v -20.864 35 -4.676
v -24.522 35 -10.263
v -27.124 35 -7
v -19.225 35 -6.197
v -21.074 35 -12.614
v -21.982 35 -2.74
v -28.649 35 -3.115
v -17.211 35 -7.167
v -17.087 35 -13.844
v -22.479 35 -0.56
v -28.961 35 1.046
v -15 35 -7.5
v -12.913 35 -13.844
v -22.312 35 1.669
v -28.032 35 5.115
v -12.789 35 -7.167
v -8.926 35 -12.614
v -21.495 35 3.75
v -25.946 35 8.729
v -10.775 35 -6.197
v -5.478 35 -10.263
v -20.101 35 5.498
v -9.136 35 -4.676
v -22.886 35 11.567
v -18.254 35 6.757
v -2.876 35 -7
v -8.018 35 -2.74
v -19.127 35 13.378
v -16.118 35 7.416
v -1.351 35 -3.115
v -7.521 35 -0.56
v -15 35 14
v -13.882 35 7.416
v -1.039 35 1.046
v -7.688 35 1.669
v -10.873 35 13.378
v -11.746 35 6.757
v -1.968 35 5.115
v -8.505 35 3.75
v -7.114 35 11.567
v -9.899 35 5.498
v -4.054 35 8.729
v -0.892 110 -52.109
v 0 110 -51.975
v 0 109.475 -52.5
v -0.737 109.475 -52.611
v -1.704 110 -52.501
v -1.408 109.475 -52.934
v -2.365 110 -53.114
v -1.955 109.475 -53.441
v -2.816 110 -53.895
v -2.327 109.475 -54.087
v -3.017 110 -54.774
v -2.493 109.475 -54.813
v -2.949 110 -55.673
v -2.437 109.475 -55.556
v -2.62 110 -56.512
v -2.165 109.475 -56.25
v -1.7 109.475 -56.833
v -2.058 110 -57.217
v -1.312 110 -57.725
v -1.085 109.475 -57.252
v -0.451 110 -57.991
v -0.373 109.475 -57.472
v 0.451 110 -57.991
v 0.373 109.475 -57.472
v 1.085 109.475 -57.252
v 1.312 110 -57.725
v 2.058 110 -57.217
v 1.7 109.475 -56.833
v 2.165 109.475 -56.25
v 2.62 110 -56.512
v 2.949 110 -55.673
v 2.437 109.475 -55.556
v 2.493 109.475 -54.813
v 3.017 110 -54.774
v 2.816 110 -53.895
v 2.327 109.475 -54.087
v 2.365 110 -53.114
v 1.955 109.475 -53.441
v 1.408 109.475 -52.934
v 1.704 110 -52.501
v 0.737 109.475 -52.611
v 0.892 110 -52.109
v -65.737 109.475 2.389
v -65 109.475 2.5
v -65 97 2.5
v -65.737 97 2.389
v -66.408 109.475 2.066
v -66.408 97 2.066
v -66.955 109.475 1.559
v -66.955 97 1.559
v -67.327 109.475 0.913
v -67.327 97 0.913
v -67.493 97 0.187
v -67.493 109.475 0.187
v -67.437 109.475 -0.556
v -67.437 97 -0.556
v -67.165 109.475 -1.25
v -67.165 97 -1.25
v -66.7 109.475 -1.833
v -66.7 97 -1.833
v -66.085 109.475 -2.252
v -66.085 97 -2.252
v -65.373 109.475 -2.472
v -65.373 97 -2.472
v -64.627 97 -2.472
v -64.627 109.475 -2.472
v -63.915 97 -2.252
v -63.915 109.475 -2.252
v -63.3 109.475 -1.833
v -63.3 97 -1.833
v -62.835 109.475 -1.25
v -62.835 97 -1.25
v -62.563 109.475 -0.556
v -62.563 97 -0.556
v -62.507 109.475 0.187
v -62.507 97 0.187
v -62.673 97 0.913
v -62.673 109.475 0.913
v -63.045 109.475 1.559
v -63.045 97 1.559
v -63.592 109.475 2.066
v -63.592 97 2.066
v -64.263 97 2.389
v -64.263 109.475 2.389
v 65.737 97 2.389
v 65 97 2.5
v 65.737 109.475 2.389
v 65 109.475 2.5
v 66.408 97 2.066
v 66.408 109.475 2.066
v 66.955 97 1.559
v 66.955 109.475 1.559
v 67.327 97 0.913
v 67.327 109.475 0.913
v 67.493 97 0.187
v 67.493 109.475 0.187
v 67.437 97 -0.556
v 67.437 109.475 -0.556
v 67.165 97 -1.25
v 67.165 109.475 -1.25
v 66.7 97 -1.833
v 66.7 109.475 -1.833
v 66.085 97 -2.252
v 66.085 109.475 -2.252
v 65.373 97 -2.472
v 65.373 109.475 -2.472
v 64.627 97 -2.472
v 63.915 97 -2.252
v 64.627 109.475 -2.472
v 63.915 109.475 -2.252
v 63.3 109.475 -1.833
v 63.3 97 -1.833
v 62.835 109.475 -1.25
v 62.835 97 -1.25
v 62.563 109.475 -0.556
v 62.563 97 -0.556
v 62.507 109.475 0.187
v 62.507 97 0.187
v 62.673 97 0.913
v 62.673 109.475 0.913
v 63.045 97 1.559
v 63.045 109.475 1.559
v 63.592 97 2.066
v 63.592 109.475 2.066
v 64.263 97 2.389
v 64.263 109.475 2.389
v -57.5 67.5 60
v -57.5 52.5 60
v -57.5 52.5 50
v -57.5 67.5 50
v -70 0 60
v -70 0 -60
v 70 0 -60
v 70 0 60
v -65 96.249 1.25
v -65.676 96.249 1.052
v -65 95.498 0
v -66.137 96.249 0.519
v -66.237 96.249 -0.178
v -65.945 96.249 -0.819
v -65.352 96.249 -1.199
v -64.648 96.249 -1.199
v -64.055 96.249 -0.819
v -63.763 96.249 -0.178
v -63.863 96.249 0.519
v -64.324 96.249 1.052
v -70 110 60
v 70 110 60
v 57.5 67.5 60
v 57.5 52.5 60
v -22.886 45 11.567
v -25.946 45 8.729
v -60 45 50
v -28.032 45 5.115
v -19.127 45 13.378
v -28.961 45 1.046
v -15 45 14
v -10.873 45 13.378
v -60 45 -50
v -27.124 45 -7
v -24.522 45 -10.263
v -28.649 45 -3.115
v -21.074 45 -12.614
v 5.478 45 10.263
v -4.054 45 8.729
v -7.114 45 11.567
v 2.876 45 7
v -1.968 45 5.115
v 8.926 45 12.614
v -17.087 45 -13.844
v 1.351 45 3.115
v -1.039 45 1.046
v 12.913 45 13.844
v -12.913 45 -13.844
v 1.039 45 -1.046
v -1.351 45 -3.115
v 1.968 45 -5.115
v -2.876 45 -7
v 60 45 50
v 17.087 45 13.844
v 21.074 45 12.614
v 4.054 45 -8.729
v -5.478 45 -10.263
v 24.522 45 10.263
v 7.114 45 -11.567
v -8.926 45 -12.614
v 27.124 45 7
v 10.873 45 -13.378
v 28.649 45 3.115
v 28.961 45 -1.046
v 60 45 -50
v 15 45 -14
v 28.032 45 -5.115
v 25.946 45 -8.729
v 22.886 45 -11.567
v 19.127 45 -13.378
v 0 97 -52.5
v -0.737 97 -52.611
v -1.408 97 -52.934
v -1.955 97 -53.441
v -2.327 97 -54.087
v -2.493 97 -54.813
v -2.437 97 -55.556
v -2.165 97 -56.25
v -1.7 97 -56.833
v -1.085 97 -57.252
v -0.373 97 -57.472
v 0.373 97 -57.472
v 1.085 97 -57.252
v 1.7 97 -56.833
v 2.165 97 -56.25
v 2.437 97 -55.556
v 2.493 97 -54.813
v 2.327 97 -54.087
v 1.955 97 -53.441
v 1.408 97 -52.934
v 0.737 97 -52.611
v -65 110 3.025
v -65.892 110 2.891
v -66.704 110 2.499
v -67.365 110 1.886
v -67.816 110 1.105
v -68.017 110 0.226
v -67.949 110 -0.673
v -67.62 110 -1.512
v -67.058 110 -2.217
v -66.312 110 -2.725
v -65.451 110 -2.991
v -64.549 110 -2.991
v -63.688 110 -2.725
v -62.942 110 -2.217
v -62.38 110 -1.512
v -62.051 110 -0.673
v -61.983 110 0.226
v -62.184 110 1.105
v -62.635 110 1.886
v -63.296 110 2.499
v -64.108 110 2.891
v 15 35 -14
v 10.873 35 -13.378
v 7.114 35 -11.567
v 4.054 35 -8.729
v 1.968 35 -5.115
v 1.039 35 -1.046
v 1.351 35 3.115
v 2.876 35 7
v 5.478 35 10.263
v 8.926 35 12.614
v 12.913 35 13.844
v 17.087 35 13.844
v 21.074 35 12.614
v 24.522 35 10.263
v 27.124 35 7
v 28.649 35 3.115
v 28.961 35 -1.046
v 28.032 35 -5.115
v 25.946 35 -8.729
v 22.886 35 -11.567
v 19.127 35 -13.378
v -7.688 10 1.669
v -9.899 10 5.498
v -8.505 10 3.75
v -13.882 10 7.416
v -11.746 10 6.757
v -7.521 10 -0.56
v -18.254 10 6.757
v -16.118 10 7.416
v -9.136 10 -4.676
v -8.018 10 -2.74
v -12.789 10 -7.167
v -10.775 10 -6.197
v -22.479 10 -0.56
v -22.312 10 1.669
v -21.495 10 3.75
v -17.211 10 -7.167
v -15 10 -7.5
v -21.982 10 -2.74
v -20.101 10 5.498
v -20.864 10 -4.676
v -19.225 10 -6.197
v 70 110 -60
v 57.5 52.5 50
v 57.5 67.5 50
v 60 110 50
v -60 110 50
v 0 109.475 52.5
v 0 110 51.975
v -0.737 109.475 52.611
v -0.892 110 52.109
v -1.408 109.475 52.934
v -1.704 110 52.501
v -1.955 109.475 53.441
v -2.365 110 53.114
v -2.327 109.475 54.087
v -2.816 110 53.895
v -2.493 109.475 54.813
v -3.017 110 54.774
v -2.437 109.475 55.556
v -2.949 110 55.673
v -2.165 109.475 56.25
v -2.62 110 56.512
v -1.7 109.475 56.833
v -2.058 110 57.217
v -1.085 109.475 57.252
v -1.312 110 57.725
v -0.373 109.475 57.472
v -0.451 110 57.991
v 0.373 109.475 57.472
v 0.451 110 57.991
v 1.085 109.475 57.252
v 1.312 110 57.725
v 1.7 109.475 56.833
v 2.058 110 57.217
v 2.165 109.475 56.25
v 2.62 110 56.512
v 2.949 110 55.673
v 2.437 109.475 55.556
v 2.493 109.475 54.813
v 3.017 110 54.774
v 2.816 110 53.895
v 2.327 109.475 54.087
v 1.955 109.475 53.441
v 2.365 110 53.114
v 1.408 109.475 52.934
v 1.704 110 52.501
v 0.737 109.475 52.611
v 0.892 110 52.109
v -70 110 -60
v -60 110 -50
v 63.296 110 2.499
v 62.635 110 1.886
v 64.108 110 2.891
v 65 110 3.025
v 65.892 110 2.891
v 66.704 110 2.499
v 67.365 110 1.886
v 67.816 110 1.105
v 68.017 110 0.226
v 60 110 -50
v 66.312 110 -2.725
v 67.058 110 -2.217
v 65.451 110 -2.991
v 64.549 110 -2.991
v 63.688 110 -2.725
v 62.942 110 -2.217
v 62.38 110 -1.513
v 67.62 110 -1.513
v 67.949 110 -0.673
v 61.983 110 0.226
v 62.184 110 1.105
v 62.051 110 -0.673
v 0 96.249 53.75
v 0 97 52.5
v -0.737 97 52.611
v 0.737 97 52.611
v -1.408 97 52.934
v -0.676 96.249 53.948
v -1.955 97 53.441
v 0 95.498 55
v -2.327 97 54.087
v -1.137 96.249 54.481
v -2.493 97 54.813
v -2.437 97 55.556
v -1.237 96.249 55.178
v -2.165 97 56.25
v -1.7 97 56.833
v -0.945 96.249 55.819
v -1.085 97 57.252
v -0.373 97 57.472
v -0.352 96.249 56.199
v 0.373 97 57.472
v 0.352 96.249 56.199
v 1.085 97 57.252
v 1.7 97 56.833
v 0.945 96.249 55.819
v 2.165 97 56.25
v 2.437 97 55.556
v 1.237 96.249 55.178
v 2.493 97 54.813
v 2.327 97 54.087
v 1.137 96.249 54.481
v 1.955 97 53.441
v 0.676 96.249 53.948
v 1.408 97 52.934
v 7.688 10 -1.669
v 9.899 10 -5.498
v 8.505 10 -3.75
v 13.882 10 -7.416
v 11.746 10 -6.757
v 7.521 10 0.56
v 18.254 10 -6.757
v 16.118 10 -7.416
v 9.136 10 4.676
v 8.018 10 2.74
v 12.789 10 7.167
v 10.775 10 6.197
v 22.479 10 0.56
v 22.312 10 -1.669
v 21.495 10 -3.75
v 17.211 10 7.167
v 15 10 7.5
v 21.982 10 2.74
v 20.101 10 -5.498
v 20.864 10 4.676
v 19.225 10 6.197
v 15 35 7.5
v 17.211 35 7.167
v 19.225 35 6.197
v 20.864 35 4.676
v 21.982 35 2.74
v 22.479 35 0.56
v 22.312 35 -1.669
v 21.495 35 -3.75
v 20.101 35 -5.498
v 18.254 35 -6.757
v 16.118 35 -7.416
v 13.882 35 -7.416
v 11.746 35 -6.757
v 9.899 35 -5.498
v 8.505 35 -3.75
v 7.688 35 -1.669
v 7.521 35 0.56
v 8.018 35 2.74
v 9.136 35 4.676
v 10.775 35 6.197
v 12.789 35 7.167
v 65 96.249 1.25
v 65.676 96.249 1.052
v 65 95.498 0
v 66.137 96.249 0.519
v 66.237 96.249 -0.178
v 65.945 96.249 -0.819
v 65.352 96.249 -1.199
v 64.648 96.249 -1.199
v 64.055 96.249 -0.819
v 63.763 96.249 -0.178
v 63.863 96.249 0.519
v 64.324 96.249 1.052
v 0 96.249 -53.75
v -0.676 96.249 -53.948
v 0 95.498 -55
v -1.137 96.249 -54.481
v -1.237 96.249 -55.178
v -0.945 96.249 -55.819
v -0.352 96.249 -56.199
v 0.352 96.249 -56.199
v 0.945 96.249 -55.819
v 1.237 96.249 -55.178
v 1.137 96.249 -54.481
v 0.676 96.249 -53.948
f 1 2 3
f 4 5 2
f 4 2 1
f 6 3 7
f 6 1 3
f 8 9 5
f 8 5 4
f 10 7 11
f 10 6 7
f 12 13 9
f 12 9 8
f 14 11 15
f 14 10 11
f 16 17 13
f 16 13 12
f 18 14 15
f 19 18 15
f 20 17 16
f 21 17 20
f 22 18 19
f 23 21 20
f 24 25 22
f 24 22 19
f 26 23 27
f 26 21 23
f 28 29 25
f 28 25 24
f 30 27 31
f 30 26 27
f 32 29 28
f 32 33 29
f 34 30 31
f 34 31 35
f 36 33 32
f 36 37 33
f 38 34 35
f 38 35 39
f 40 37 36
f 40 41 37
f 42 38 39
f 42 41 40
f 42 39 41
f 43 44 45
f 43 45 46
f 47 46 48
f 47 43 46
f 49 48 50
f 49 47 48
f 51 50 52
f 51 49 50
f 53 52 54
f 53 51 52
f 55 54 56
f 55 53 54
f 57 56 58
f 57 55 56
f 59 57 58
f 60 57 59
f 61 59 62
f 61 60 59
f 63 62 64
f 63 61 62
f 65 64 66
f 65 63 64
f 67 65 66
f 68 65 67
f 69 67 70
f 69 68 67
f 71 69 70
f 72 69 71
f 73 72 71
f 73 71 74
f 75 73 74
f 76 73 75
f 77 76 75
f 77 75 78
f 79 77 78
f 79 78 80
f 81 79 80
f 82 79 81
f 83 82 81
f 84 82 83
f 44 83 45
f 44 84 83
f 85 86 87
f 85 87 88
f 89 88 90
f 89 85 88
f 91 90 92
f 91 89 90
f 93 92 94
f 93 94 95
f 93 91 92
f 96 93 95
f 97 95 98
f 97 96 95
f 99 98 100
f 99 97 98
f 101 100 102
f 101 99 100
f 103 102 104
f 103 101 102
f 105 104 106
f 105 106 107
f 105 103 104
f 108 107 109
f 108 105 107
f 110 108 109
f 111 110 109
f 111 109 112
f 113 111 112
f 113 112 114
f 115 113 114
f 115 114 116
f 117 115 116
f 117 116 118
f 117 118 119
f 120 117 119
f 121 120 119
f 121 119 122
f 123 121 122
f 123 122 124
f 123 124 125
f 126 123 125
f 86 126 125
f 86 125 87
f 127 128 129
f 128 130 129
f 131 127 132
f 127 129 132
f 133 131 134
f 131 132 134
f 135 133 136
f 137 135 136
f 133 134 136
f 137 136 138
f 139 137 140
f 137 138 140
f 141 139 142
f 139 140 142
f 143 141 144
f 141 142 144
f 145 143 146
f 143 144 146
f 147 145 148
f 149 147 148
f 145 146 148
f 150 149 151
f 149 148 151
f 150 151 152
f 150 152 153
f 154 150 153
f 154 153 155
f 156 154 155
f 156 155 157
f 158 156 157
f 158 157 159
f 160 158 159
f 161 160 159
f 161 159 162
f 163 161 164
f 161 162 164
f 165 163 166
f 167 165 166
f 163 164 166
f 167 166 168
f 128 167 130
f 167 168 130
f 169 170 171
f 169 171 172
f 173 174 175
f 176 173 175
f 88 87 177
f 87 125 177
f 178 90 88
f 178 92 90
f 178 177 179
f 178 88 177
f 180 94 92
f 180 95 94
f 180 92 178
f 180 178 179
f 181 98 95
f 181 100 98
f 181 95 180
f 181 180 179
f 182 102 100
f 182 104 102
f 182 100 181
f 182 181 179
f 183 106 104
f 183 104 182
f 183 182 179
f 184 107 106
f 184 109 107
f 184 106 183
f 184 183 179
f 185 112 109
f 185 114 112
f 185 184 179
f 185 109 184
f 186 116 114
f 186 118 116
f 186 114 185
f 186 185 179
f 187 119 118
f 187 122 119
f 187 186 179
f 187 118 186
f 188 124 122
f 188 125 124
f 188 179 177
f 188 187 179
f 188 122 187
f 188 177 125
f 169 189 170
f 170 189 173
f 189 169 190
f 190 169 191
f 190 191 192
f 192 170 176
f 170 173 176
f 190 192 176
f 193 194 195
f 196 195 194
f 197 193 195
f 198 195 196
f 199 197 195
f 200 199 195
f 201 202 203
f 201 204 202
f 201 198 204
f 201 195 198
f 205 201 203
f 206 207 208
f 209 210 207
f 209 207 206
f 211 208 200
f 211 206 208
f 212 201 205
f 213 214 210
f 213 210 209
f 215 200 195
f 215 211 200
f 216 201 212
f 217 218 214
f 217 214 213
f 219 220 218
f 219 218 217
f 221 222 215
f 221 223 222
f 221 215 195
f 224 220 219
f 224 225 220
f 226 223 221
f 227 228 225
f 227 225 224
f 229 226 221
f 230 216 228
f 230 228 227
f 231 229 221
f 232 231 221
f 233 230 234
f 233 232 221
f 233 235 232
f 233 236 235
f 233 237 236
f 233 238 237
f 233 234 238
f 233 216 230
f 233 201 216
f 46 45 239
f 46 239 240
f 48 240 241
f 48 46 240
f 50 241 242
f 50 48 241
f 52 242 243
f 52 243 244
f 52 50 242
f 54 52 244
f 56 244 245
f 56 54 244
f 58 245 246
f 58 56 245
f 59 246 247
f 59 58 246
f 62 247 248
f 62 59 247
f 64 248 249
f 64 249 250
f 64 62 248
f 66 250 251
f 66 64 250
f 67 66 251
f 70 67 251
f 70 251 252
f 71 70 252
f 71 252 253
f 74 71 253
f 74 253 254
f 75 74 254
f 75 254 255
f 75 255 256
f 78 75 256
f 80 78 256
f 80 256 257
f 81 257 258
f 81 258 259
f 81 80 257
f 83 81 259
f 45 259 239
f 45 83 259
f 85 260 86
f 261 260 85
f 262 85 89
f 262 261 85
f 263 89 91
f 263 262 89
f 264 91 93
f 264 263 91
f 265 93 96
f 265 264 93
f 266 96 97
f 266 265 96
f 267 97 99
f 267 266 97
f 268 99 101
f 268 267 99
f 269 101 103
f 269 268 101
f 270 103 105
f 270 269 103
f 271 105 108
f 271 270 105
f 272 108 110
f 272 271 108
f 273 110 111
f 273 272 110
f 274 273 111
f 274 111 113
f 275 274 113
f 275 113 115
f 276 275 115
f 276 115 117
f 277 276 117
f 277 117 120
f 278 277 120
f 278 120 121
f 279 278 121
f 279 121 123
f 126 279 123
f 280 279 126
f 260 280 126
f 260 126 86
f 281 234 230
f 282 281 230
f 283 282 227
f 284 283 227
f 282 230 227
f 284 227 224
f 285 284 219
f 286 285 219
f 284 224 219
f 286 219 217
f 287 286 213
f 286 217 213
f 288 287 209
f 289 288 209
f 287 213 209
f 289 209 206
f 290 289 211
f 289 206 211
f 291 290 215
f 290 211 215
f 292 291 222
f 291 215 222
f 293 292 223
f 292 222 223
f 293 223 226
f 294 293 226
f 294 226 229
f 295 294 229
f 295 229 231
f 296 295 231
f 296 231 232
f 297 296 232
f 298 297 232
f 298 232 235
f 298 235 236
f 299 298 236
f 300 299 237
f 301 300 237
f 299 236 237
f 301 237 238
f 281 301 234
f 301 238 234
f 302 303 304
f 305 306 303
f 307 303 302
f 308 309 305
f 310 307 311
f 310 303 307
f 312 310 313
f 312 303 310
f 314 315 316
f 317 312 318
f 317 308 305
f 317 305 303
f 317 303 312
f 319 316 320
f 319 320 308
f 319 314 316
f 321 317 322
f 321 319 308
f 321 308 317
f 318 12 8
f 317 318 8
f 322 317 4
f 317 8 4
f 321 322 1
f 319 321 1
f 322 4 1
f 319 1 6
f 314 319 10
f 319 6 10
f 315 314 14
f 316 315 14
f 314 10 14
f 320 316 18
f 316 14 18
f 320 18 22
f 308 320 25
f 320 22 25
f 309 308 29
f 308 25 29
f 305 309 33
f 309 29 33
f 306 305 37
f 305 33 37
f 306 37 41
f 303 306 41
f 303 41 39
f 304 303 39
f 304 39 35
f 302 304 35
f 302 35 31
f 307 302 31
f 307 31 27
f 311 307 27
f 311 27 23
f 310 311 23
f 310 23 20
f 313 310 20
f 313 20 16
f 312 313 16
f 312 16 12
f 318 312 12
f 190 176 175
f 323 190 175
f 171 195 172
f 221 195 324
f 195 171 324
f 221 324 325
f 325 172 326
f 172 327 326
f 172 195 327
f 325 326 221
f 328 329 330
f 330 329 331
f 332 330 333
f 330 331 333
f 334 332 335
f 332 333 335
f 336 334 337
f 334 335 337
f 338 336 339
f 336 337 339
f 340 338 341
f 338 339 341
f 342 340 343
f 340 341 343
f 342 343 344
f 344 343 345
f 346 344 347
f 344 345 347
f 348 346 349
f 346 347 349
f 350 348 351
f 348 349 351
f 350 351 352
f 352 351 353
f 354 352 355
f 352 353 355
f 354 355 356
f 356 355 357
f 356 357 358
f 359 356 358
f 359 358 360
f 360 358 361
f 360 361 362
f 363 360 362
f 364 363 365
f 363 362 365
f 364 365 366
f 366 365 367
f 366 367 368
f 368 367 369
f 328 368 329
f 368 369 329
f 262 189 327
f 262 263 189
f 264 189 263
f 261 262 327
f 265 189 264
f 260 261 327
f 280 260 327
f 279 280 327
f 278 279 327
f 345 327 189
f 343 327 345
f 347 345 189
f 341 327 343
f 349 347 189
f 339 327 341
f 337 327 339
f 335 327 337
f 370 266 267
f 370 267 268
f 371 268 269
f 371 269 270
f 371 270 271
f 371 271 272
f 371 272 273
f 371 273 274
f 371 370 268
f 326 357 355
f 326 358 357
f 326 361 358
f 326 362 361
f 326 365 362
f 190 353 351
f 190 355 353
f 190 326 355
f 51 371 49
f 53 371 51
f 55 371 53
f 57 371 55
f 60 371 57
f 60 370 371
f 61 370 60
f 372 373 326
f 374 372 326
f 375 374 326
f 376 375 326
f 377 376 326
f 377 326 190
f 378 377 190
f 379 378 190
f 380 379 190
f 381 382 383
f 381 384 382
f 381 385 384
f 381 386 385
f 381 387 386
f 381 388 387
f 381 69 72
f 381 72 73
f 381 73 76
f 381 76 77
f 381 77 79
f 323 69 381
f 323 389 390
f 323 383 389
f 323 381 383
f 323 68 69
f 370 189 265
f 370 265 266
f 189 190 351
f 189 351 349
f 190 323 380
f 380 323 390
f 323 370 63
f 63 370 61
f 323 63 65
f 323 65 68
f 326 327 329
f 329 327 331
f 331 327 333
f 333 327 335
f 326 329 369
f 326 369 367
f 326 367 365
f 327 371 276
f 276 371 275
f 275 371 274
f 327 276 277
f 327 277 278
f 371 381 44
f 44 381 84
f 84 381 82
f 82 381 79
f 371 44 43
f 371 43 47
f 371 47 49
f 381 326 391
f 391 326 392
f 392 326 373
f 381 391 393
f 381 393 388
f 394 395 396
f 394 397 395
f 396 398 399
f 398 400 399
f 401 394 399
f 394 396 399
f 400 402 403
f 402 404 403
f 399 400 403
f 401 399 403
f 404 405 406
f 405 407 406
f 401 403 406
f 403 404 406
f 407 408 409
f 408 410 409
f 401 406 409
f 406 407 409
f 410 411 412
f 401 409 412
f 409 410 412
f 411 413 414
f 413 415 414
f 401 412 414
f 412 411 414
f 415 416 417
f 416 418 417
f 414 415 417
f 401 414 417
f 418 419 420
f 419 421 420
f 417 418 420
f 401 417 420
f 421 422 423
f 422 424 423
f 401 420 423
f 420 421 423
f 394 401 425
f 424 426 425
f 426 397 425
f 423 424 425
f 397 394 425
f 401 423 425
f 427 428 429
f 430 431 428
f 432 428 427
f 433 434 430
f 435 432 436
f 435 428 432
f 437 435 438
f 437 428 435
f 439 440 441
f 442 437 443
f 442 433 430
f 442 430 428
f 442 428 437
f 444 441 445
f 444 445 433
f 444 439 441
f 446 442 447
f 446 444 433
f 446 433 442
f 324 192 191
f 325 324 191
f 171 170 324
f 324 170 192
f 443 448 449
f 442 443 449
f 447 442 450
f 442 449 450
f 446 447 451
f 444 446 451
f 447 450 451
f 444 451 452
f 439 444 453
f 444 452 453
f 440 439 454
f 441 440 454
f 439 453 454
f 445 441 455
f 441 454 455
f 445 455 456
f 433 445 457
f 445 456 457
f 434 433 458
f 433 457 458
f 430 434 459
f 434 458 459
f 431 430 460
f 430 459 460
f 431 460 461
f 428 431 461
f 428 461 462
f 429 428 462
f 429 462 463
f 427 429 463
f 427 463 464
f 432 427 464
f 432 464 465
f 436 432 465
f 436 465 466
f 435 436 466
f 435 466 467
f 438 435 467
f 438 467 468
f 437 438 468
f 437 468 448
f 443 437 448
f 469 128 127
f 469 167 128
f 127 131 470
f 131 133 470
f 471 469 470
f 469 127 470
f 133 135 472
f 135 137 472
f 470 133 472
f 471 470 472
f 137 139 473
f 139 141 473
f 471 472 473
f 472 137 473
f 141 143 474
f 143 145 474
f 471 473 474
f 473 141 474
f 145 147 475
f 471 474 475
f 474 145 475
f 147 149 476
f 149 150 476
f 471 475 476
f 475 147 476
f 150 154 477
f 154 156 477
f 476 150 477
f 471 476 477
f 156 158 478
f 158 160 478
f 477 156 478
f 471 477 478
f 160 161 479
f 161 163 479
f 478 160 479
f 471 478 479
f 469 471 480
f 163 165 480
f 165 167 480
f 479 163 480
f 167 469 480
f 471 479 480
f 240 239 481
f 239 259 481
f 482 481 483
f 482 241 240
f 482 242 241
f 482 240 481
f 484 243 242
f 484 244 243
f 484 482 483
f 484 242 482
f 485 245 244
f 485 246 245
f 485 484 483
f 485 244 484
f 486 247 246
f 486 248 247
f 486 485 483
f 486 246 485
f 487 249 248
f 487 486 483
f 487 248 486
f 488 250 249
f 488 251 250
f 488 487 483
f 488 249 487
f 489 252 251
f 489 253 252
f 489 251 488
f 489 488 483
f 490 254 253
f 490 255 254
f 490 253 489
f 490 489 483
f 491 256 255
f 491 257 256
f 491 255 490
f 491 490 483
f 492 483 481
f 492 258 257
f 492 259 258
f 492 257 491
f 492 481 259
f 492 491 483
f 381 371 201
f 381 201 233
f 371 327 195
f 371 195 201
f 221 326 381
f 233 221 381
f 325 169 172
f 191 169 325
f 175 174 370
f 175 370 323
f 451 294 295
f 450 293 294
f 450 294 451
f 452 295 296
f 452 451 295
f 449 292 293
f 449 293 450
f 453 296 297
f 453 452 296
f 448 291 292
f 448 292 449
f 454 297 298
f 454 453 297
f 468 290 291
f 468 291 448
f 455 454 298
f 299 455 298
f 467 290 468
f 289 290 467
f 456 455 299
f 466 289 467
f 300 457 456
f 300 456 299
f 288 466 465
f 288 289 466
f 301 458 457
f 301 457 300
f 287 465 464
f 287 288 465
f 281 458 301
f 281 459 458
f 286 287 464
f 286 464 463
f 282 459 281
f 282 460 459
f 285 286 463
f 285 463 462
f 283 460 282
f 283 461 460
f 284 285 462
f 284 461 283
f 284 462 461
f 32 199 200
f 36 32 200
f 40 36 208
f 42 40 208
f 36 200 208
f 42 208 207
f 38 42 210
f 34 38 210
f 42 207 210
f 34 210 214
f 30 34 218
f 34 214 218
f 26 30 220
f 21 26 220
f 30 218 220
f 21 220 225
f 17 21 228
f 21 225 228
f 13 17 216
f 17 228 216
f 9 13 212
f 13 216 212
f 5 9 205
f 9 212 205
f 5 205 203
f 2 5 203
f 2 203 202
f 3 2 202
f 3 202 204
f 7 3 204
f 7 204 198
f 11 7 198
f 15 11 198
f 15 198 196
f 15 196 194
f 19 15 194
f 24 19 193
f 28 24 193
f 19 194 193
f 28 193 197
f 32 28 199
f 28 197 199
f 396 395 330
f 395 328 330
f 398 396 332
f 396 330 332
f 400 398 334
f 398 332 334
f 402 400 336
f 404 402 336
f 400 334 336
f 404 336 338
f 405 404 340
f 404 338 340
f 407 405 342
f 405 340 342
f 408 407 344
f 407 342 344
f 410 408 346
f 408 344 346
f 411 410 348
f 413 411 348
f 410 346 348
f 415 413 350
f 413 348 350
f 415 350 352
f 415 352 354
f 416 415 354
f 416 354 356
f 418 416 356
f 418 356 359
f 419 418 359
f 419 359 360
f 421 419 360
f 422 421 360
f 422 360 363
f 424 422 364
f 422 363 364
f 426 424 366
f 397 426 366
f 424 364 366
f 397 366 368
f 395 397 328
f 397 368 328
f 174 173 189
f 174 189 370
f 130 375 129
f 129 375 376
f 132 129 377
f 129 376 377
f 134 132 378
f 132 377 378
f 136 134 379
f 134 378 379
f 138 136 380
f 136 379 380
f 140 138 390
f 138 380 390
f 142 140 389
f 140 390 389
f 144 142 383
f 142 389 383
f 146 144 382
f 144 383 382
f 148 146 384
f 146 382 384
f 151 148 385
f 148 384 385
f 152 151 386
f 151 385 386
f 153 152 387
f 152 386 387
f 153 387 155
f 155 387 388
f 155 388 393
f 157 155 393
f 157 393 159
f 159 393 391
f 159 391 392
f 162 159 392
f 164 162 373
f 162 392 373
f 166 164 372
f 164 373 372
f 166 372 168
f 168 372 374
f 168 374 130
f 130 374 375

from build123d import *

# Parameters (mm, degrees)
BOX_TOP_VIEW_W                 = 140
BOX_TOP_VIEW_H                 = 120
BOX_EXTRUDE_PART_DEPTH         = 110
INNER_BOX_CUT_W                = 120
INNER_BOX_CUT_H                = 100
INNER_BOX_CUT_1_DEPTH          = 65
SCISSOR_CROSSSECTION_W         = 115
SCISSOR_CROSSSECTION_H         = 15
SCISSOR_CORSSSECTION_CUT_DEPTH = 10
SHAFT_LOCATION_R               = 7.5
SHAFT_LOCATION_CUT_DEPTH       = 35
SKETCH2_R                      = 14
CUT_EXTRUDE2_DEPTH             = 10
M6_TAPPED_HOLE3_AT_2_COUNT     = 2
M6_TAPPED_HOLE3_AT_2_PITCH     = 85.14693183


with BuildPart() as part:
    # Box_top_view → Box_extrude_part (new body)
    with BuildSketch(Plane(origin=(0, 0, 0), x_dir=(1, 0, 0), z_dir=(0, 1, 0))):
        Rectangle(BOX_TOP_VIEW_W, BOX_TOP_VIEW_H)
    extrude(amount=BOX_EXTRUDE_PART_DEPTH)

    # Inner_box_cut → Inner_box_cut_1 (cut)
    with BuildSketch(Plane(origin=(0, 110, 0), x_dir=(1, 0, 0), z_dir=(0, 1, 0))):
        Rectangle(INNER_BOX_CUT_W, INNER_BOX_CUT_H)
    extrude(amount=-INNER_BOX_CUT_1_DEPTH, mode=Mode.SUBTRACT)

    # Scissor_crossSection → Scissor_corssSection_cut (cut)
    with BuildSketch(Plane.XY.offset(60)):
        with Locations((0, 60)):
            Rectangle(SCISSOR_CROSSSECTION_W, SCISSOR_CROSSSECTION_H)
    extrude(amount=-SCISSOR_CORSSSECTION_CUT_DEPTH, mode=Mode.SUBTRACT)

    # Shaft_location → Shaft_location_cut (cut)
    with BuildSketch(Plane(origin=(0, 45, 0), x_dir=(1, 0, 0), z_dir=(0, 1, 0))):
        with Locations(Location((15, 0, 0), (0, 0, 270))):
            Circle(SHAFT_LOCATION_R)
        with Locations(Location((-15, 0, 0), (0, 0, 90))):
            Circle(SHAFT_LOCATION_R)
    extrude(amount=-SHAFT_LOCATION_CUT_DEPTH, mode=Mode.SUBTRACT)

    # Sketch2 → Cut-Extrude2 (cut)
    with BuildSketch(Plane(origin=(0, 45, 0), x_dir=(1, 0, 0), z_dir=(0, 1, 0))):
        with Locations(Location((-15, 0, 0), (0, 0, 270))):
            Circle(SKETCH2_R)
        with Locations(Location((15, 0, 0), (0, 0, 90))):
            Circle(SKETCH2_R)
    extrude(amount=-CUT_EXTRUDE2_DEPTH, mode=Mode.SUBTRACT)

    # Sketch7 → M6 Tapped Hole3 (revolve, cut)
    with BuildSketch(Plane(origin=(0, 110, -55), x_dir=(0, 0, 1), z_dir=(1, 0, 0))):
        Polygon((0, 0), (0, 14.502151548), (2.5, 13), (2.5, 0.525), (3.025, 0), align=None)
    m6_tapped_hole3 = revolve(axis=Axis((0, 116.35, -55), (0, -1, 0)), mode=Mode.SUBTRACT)

    # M6 Tapped Hole3 at 2: M6 Tapped Hole3 ×2
    with Locations(*[Vector(-0.7633862853691146, 0, 0.645942241466174) * (i * M6_TAPPED_HOLE3_AT_2_PITCH) for i in range(1, M6_TAPPED_HOLE3_AT_2_COUNT)]):
        add(m6_tapped_hole3, mode=Mode.SUBTRACT)

    # M6_hole_mirror: M6 Tapped Hole3 across plane
    add(m6_tapped_hole3.mirror(Plane(origin=(0, 0, 0), x_dir=(0, 0, 1), z_dir=(1, 0, 0))), mode=Mode.SUBTRACT)

    # M6_hole_mirror copy 1 sketch → M6_hole_mirror copy 1 (revolve, cut)
    with BuildSketch(Plane(origin=(65, 110, 0), x_dir=(0, 0, 1), z_dir=(-1, 0, 0))):
        Polygon((0, 0), (0, -14.502151548), (2.5, -13), (2.5, -0.525), (3.025, 0), align=None)
    revolve(axis=Axis((65, 116.35, 0), (0, 1, 0)), mode=Mode.SUBTRACT)

    # M6_hole_mirror at the second plane: M6 Tapped Hole3 across plane
    add(m6_tapped_hole3.mirror(Plane.XY), mode=Mode.SUBTRACT)

    # M6_hole_mirror at the second plane copy → M6_hole_mirror at the second plane c 2 (revolve, cut)
    with BuildSketch(Plane(origin=(-65, 110, 0), x_dir=(0, 0, -1), z_dir=(1, 0, 0))):
        Polygon((0, 0), (0, -14.502151548), (2.5, -13), (2.5, -0.525), (3.025, 0), align=None)
    revolve(axis=Axis((-65, 116.35, 0), (0, 1, 0)), mode=Mode.SUBTRACT)


solid = part.part
